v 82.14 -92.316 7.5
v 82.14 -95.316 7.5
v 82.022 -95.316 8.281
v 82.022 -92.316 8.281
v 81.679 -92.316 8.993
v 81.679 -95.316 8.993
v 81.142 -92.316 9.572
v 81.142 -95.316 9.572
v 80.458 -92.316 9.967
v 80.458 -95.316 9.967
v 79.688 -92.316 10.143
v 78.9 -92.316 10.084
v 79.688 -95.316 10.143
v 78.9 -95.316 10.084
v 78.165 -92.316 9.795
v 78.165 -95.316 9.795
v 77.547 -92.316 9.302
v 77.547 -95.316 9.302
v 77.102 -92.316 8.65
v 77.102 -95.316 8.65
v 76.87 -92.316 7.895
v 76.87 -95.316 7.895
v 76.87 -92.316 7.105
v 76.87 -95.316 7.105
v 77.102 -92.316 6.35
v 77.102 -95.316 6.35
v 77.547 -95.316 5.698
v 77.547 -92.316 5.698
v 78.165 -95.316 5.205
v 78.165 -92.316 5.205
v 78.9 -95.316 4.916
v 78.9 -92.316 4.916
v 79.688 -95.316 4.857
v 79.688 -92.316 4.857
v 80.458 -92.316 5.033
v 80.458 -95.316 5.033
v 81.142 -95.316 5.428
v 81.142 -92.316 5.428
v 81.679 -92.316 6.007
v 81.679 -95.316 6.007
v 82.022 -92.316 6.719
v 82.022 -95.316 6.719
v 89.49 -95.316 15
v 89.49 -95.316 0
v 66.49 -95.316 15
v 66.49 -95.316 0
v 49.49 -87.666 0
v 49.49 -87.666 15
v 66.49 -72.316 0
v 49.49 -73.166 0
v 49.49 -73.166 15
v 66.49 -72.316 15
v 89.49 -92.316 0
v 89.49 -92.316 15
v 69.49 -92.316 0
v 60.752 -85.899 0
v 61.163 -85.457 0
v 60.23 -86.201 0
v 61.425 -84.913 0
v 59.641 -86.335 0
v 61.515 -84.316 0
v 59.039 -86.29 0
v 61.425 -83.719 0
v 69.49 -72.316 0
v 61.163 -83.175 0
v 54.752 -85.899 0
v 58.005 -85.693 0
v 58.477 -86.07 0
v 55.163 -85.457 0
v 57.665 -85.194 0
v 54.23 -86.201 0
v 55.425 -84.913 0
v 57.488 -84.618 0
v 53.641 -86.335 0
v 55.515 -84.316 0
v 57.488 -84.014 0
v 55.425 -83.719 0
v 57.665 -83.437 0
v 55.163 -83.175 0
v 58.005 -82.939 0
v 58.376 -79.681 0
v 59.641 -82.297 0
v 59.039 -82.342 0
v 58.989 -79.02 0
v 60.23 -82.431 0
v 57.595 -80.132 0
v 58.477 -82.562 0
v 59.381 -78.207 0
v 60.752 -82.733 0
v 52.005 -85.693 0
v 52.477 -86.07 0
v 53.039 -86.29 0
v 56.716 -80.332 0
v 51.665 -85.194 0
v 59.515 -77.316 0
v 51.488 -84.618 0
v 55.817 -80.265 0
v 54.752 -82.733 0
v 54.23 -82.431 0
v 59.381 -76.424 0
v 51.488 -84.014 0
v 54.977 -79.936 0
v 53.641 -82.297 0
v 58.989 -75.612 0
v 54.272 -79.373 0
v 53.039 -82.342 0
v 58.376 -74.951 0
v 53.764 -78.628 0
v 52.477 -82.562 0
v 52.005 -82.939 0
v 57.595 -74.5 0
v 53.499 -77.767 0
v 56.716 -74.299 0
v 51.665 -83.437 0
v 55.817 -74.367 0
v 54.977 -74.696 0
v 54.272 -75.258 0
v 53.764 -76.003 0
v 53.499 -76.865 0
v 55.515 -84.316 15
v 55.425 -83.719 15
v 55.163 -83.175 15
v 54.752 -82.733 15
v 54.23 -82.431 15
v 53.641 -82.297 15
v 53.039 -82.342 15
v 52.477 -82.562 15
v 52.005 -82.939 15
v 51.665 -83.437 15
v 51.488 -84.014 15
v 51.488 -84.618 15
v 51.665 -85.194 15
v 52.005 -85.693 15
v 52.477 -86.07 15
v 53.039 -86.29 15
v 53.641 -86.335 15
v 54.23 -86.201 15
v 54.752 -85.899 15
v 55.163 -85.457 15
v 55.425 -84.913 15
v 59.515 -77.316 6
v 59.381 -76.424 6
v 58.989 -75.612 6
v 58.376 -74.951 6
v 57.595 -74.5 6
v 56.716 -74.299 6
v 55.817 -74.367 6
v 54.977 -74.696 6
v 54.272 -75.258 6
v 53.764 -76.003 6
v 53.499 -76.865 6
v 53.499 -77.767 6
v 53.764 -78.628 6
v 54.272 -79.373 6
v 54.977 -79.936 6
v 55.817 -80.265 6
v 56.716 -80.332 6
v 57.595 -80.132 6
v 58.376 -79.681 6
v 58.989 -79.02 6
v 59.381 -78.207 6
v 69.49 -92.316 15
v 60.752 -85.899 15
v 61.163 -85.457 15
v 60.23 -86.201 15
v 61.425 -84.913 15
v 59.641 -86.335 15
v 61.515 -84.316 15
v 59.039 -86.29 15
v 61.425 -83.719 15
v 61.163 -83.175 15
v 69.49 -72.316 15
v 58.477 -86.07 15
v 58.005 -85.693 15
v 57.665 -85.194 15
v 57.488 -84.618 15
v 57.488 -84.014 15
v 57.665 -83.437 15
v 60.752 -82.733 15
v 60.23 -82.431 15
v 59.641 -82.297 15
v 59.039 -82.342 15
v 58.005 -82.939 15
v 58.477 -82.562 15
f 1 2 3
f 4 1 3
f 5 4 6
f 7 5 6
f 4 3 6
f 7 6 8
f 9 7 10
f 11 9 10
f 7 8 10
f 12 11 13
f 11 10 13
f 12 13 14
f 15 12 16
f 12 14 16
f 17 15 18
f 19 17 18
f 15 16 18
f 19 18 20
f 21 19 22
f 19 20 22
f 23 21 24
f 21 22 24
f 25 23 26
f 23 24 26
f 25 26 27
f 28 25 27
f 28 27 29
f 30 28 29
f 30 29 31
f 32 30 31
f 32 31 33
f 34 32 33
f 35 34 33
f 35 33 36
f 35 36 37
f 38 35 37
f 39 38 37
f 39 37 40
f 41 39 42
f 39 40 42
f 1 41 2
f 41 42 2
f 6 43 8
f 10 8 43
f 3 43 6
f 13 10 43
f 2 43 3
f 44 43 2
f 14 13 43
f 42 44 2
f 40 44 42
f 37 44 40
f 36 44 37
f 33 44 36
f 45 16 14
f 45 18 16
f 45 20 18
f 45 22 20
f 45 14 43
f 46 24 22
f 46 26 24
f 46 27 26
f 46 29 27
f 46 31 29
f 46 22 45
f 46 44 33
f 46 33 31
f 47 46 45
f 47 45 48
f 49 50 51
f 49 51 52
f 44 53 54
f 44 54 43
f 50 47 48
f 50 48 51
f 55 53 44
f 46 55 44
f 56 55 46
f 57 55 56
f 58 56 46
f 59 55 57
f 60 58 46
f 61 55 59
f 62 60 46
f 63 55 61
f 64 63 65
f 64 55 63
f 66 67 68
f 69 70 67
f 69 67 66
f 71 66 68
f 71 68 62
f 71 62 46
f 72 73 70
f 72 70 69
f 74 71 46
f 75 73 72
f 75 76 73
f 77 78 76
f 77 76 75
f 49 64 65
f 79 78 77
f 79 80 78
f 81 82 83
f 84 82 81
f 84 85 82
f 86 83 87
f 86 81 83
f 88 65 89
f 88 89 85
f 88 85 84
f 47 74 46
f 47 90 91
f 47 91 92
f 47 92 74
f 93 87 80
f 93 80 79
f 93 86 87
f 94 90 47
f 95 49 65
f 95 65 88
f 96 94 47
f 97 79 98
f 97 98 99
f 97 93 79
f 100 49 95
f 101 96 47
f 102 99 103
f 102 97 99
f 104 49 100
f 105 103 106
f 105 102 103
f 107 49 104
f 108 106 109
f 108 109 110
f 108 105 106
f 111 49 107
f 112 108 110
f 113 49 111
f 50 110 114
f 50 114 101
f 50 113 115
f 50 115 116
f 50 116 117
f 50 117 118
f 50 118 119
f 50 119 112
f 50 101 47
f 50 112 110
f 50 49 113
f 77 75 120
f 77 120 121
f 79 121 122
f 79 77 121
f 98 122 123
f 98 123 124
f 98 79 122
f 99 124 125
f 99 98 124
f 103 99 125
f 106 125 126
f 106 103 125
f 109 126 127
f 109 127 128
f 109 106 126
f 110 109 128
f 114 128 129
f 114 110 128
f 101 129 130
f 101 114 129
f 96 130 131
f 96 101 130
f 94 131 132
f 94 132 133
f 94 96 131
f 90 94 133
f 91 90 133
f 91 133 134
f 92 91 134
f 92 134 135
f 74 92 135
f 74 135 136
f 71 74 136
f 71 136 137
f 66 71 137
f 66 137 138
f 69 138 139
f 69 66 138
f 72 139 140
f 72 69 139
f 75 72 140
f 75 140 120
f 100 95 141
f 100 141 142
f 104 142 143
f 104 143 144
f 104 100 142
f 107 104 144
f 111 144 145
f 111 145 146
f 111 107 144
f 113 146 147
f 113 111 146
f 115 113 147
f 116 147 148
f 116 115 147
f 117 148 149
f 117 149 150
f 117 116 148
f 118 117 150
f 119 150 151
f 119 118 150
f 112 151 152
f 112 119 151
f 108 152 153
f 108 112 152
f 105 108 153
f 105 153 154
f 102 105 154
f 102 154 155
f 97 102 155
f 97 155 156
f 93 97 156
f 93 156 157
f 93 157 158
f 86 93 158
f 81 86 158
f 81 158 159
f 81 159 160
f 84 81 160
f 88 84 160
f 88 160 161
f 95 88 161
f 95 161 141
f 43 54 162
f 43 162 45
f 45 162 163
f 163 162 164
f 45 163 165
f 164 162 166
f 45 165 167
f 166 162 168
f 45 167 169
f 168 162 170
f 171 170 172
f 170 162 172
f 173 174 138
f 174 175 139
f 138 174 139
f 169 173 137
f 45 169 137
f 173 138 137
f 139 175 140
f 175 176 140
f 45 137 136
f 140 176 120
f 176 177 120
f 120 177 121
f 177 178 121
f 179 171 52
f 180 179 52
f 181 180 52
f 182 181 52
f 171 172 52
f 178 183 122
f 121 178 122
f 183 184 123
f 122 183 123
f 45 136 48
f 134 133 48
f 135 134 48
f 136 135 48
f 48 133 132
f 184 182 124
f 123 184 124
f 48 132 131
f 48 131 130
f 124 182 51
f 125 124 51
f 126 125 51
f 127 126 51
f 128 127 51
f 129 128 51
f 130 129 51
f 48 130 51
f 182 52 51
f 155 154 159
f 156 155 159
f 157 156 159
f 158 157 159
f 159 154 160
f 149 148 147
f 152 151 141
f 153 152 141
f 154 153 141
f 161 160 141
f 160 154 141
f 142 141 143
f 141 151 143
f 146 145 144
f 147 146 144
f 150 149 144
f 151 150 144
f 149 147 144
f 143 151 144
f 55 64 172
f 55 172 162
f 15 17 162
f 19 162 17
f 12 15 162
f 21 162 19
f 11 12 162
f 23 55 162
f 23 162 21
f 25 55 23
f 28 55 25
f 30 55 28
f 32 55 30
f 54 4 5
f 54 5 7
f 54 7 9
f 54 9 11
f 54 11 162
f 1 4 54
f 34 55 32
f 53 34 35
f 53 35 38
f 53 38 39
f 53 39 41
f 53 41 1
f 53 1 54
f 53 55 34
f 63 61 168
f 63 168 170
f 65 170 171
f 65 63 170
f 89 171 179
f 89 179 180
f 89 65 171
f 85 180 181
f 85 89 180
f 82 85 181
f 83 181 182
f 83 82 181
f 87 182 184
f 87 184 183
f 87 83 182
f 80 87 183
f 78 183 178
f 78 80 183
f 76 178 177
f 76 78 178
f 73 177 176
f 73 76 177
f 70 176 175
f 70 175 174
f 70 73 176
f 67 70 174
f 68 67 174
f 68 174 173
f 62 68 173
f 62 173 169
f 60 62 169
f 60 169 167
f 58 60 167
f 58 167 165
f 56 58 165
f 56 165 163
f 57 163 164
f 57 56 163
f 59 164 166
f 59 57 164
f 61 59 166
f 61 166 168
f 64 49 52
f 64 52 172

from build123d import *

# Parameters (mm, degrees)
SKETCH1_R           = 3.025
SKETCH1_R_2         = 2.025
BOSS_EXTRUDE1_DEPTH = 15
BOSS_EXTRUDE2_START = 6
SKETCH1_2_R         = 3.025
BOSS_EXTRUDE2_DEPTH = 9
SKETCH2_R           = 2.65
CUT_EXTRUDE1_DEPTH  = 3


with BuildPart() as part:
    # Sketch1 → Boss-Extrude1 (new body)
    with BuildSketch(Plane.XY):
        Polygon((66.489922843, -72.31585339), (69.489922843, -72.31585339), (69.489922843, -92.31585339), (89.489922843, -92.31585339), (89.489922843, -95.31585339), (66.489922843, -95.31585339), (49.489922843, -87.66585339), (49.489922843, -73.16585339), align=None)
        with Locations((56.489922843, -77.31585339)):
            Circle(SKETCH1_R, mode=Mode.SUBTRACT)
        with Locations((53.489922843, -84.31585339)):
            Circle(SKETCH1_R_2, mode=Mode.SUBTRACT)
        with Locations((59.489922843, -84.31585339)):
            Circle(SKETCH1_R_2, mode=Mode.SUBTRACT)
    extrude(amount=BOSS_EXTRUDE1_DEPTH)

    # Sketch1<2> → Boss-Extrude2 (add)
    with BuildSketch(Plane.XY.offset(BOSS_EXTRUDE2_START)):
        with Locations((56.489922843, -77.31585339)):
            Circle(SKETCH1_2_R)
    extrude(amount=BOSS_EXTRUDE2_DEPTH)

    # Sketch2 → Cut-Extrude1 (cut)
    with BuildSketch(Plane.XZ.offset(95.31585339)):
        with Locations((79.489922843, 7.5)):
            Circle(SKETCH2_R)
    extrude(amount=-CUT_EXTRUDE1_DEPTH, mode=Mode.SUBTRACT)


solid = part.part
